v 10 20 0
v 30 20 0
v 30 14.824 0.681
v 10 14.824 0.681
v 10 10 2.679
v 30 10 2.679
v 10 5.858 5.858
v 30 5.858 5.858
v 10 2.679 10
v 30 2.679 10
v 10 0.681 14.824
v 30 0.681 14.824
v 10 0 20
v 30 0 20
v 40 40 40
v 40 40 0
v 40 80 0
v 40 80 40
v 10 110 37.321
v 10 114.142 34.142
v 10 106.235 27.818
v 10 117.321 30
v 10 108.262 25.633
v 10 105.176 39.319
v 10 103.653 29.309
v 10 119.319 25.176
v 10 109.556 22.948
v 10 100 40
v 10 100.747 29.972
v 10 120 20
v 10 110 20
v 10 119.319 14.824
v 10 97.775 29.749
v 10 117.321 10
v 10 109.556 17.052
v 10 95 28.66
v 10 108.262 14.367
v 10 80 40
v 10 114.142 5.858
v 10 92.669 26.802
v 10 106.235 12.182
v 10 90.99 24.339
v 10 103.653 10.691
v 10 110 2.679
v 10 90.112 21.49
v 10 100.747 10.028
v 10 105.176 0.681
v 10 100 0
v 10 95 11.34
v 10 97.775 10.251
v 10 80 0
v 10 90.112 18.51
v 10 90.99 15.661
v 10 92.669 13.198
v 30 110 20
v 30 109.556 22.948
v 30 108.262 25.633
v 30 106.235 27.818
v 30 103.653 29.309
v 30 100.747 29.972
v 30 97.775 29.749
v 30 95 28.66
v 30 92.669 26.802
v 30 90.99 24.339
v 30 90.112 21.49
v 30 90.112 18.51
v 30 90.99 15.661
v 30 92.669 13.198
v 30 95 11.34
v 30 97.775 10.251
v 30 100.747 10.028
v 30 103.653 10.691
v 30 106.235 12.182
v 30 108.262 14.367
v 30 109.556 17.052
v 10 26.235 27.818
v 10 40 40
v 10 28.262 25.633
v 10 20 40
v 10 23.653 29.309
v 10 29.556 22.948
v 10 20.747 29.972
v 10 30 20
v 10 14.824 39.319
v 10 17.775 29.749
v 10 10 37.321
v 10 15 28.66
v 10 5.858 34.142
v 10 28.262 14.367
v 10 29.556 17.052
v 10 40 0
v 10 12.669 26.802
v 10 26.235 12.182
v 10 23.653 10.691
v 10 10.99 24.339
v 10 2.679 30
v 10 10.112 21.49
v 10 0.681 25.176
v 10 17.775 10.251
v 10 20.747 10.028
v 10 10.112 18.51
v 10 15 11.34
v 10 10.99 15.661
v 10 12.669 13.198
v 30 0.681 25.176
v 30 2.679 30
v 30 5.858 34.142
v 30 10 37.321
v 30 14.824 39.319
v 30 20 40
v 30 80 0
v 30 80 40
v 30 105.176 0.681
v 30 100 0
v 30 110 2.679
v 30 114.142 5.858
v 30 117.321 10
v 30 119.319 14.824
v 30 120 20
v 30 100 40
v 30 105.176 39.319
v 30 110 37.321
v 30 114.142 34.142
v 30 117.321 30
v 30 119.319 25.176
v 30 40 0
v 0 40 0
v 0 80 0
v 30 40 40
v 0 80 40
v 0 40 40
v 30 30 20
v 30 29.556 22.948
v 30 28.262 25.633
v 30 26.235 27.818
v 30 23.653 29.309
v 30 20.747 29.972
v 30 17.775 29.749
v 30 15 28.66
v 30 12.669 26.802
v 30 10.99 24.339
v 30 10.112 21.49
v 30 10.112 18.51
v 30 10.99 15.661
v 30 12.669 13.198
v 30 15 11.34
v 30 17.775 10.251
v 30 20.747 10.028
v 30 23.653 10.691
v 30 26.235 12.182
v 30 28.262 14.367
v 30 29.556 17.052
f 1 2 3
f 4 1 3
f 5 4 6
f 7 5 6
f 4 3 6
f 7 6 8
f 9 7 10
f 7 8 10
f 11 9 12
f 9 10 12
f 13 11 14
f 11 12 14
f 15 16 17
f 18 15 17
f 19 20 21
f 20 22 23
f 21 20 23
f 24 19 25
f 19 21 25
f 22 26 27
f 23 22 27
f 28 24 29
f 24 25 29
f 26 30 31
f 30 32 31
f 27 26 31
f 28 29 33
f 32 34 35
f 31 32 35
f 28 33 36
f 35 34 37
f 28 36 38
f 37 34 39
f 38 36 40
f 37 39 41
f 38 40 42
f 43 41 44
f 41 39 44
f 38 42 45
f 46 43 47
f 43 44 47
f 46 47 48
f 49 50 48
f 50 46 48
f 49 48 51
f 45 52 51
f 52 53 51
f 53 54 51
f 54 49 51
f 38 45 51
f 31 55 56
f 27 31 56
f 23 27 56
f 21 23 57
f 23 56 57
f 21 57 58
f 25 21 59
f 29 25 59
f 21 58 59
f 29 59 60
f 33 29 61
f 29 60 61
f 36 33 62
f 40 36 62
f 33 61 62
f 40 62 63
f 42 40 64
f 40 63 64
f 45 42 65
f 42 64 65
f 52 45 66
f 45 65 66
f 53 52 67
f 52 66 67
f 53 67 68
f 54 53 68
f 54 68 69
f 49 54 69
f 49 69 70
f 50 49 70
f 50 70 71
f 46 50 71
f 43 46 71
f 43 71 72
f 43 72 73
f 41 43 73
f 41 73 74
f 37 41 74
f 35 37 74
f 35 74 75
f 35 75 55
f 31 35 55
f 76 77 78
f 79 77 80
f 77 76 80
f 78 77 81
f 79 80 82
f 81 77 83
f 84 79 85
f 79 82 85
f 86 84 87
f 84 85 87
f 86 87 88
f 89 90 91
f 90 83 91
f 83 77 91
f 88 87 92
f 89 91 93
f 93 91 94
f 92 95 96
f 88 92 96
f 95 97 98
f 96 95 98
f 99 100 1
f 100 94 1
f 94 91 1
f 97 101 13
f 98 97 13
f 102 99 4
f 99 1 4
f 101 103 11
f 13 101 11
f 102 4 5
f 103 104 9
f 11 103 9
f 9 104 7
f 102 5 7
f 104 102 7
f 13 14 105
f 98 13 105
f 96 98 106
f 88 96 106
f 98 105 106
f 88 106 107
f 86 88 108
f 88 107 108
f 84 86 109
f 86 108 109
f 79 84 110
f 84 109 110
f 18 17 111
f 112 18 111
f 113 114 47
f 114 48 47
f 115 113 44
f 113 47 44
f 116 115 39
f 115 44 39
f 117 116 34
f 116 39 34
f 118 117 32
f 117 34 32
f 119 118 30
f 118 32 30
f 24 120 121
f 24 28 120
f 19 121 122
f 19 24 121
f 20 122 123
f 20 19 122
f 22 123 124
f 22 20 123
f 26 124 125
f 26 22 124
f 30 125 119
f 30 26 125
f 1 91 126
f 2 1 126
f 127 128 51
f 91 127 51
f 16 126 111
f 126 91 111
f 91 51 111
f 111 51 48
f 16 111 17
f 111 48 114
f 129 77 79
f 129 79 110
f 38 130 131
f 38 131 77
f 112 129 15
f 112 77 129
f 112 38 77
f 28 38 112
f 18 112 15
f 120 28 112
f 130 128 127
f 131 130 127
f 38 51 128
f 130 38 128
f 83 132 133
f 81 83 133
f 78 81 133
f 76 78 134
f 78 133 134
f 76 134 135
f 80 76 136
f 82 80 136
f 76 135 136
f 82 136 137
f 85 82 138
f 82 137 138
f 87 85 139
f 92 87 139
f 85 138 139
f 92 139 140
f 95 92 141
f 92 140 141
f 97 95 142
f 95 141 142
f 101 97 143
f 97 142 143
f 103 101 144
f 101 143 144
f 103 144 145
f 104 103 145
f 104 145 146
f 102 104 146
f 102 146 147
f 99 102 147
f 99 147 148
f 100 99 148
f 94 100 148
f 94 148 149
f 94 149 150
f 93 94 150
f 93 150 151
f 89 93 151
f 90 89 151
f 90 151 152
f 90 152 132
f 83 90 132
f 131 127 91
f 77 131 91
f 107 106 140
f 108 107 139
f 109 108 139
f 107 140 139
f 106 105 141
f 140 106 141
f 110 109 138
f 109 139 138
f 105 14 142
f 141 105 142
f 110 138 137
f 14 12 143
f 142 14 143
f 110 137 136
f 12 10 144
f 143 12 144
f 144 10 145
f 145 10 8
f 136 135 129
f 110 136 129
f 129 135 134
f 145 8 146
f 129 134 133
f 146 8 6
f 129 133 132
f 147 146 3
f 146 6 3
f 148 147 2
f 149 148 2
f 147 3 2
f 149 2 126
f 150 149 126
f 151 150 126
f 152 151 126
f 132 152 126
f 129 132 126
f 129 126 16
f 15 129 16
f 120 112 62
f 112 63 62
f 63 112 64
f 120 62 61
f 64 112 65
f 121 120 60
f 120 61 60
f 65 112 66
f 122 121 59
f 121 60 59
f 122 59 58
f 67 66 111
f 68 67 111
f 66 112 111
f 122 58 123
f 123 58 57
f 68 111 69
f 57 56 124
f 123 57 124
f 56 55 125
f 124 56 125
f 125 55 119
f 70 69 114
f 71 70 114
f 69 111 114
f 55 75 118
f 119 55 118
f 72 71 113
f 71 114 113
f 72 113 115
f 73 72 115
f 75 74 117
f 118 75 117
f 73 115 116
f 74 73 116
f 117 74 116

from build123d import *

# Parameters (mm, degrees)
F1_DEPTH = 40
F3_DEPTH = 20
F4_R     = 19.99999
F5_R     = 10
F6_DEPTH = 25


# Not quite as in the source:
# - a fillet or chamfer is up to 0.001 mm smaller than in the source, because OpenCascade refuses the exact size


with BuildPart() as f1:
    # F0 (on Top) → F1 (new body)
    with BuildSketch(Plane.XY):
        Polygon((10, 40), (10, 0), (30, 0), (30, 40), (40, 40), (40, 80), (30, 80), (30, 120), (10, 120), (10, 80), (0, 80), (0, 40), align=None)
    extrude(amount=F1_DEPTH)

    # F2 (on face) → F3 (cut)
    with BuildSketch(Plane.YZ.offset(30)):
        with BuildLine():
            ThreePointArc((20, 0), (5.8578643763, 5.8578643763), (0, 20))
            Line((0, 20), (0, 0))
            Line((0, 0), (20, 0))
        make_face()
        with BuildLine():
            ThreePointArc((0, 20), (5.8578643763, 34.1421356237), (20, 40))
            Line((20, 40), (0, 40))
            Line((0, 40), (0, 20))
        make_face()
    extrude(amount=-F3_DEPTH, mode=Mode.SUBTRACT)

    # F4 (radius 20 in the source; OpenCascade refuses exactly that, so slightly less here)
    f4_edges = [f1.edges().sort_by_distance(p)[0] for p in [
        (20, 120, 0),
        (20, 120, 40),
    ]]
    fillet(f4_edges, radius=F4_R)

    # F5 (on face) → F6 (cut)
    with BuildSketch(Plane.YZ.offset(30)):
        with Locations((100, 20)):
            Circle(F5_R)
        with Locations((20, 20)):
            Circle(F5_R)
    extrude(amount=-F6_DEPTH, mode=Mode.SUBTRACT)


solid = f1.part
